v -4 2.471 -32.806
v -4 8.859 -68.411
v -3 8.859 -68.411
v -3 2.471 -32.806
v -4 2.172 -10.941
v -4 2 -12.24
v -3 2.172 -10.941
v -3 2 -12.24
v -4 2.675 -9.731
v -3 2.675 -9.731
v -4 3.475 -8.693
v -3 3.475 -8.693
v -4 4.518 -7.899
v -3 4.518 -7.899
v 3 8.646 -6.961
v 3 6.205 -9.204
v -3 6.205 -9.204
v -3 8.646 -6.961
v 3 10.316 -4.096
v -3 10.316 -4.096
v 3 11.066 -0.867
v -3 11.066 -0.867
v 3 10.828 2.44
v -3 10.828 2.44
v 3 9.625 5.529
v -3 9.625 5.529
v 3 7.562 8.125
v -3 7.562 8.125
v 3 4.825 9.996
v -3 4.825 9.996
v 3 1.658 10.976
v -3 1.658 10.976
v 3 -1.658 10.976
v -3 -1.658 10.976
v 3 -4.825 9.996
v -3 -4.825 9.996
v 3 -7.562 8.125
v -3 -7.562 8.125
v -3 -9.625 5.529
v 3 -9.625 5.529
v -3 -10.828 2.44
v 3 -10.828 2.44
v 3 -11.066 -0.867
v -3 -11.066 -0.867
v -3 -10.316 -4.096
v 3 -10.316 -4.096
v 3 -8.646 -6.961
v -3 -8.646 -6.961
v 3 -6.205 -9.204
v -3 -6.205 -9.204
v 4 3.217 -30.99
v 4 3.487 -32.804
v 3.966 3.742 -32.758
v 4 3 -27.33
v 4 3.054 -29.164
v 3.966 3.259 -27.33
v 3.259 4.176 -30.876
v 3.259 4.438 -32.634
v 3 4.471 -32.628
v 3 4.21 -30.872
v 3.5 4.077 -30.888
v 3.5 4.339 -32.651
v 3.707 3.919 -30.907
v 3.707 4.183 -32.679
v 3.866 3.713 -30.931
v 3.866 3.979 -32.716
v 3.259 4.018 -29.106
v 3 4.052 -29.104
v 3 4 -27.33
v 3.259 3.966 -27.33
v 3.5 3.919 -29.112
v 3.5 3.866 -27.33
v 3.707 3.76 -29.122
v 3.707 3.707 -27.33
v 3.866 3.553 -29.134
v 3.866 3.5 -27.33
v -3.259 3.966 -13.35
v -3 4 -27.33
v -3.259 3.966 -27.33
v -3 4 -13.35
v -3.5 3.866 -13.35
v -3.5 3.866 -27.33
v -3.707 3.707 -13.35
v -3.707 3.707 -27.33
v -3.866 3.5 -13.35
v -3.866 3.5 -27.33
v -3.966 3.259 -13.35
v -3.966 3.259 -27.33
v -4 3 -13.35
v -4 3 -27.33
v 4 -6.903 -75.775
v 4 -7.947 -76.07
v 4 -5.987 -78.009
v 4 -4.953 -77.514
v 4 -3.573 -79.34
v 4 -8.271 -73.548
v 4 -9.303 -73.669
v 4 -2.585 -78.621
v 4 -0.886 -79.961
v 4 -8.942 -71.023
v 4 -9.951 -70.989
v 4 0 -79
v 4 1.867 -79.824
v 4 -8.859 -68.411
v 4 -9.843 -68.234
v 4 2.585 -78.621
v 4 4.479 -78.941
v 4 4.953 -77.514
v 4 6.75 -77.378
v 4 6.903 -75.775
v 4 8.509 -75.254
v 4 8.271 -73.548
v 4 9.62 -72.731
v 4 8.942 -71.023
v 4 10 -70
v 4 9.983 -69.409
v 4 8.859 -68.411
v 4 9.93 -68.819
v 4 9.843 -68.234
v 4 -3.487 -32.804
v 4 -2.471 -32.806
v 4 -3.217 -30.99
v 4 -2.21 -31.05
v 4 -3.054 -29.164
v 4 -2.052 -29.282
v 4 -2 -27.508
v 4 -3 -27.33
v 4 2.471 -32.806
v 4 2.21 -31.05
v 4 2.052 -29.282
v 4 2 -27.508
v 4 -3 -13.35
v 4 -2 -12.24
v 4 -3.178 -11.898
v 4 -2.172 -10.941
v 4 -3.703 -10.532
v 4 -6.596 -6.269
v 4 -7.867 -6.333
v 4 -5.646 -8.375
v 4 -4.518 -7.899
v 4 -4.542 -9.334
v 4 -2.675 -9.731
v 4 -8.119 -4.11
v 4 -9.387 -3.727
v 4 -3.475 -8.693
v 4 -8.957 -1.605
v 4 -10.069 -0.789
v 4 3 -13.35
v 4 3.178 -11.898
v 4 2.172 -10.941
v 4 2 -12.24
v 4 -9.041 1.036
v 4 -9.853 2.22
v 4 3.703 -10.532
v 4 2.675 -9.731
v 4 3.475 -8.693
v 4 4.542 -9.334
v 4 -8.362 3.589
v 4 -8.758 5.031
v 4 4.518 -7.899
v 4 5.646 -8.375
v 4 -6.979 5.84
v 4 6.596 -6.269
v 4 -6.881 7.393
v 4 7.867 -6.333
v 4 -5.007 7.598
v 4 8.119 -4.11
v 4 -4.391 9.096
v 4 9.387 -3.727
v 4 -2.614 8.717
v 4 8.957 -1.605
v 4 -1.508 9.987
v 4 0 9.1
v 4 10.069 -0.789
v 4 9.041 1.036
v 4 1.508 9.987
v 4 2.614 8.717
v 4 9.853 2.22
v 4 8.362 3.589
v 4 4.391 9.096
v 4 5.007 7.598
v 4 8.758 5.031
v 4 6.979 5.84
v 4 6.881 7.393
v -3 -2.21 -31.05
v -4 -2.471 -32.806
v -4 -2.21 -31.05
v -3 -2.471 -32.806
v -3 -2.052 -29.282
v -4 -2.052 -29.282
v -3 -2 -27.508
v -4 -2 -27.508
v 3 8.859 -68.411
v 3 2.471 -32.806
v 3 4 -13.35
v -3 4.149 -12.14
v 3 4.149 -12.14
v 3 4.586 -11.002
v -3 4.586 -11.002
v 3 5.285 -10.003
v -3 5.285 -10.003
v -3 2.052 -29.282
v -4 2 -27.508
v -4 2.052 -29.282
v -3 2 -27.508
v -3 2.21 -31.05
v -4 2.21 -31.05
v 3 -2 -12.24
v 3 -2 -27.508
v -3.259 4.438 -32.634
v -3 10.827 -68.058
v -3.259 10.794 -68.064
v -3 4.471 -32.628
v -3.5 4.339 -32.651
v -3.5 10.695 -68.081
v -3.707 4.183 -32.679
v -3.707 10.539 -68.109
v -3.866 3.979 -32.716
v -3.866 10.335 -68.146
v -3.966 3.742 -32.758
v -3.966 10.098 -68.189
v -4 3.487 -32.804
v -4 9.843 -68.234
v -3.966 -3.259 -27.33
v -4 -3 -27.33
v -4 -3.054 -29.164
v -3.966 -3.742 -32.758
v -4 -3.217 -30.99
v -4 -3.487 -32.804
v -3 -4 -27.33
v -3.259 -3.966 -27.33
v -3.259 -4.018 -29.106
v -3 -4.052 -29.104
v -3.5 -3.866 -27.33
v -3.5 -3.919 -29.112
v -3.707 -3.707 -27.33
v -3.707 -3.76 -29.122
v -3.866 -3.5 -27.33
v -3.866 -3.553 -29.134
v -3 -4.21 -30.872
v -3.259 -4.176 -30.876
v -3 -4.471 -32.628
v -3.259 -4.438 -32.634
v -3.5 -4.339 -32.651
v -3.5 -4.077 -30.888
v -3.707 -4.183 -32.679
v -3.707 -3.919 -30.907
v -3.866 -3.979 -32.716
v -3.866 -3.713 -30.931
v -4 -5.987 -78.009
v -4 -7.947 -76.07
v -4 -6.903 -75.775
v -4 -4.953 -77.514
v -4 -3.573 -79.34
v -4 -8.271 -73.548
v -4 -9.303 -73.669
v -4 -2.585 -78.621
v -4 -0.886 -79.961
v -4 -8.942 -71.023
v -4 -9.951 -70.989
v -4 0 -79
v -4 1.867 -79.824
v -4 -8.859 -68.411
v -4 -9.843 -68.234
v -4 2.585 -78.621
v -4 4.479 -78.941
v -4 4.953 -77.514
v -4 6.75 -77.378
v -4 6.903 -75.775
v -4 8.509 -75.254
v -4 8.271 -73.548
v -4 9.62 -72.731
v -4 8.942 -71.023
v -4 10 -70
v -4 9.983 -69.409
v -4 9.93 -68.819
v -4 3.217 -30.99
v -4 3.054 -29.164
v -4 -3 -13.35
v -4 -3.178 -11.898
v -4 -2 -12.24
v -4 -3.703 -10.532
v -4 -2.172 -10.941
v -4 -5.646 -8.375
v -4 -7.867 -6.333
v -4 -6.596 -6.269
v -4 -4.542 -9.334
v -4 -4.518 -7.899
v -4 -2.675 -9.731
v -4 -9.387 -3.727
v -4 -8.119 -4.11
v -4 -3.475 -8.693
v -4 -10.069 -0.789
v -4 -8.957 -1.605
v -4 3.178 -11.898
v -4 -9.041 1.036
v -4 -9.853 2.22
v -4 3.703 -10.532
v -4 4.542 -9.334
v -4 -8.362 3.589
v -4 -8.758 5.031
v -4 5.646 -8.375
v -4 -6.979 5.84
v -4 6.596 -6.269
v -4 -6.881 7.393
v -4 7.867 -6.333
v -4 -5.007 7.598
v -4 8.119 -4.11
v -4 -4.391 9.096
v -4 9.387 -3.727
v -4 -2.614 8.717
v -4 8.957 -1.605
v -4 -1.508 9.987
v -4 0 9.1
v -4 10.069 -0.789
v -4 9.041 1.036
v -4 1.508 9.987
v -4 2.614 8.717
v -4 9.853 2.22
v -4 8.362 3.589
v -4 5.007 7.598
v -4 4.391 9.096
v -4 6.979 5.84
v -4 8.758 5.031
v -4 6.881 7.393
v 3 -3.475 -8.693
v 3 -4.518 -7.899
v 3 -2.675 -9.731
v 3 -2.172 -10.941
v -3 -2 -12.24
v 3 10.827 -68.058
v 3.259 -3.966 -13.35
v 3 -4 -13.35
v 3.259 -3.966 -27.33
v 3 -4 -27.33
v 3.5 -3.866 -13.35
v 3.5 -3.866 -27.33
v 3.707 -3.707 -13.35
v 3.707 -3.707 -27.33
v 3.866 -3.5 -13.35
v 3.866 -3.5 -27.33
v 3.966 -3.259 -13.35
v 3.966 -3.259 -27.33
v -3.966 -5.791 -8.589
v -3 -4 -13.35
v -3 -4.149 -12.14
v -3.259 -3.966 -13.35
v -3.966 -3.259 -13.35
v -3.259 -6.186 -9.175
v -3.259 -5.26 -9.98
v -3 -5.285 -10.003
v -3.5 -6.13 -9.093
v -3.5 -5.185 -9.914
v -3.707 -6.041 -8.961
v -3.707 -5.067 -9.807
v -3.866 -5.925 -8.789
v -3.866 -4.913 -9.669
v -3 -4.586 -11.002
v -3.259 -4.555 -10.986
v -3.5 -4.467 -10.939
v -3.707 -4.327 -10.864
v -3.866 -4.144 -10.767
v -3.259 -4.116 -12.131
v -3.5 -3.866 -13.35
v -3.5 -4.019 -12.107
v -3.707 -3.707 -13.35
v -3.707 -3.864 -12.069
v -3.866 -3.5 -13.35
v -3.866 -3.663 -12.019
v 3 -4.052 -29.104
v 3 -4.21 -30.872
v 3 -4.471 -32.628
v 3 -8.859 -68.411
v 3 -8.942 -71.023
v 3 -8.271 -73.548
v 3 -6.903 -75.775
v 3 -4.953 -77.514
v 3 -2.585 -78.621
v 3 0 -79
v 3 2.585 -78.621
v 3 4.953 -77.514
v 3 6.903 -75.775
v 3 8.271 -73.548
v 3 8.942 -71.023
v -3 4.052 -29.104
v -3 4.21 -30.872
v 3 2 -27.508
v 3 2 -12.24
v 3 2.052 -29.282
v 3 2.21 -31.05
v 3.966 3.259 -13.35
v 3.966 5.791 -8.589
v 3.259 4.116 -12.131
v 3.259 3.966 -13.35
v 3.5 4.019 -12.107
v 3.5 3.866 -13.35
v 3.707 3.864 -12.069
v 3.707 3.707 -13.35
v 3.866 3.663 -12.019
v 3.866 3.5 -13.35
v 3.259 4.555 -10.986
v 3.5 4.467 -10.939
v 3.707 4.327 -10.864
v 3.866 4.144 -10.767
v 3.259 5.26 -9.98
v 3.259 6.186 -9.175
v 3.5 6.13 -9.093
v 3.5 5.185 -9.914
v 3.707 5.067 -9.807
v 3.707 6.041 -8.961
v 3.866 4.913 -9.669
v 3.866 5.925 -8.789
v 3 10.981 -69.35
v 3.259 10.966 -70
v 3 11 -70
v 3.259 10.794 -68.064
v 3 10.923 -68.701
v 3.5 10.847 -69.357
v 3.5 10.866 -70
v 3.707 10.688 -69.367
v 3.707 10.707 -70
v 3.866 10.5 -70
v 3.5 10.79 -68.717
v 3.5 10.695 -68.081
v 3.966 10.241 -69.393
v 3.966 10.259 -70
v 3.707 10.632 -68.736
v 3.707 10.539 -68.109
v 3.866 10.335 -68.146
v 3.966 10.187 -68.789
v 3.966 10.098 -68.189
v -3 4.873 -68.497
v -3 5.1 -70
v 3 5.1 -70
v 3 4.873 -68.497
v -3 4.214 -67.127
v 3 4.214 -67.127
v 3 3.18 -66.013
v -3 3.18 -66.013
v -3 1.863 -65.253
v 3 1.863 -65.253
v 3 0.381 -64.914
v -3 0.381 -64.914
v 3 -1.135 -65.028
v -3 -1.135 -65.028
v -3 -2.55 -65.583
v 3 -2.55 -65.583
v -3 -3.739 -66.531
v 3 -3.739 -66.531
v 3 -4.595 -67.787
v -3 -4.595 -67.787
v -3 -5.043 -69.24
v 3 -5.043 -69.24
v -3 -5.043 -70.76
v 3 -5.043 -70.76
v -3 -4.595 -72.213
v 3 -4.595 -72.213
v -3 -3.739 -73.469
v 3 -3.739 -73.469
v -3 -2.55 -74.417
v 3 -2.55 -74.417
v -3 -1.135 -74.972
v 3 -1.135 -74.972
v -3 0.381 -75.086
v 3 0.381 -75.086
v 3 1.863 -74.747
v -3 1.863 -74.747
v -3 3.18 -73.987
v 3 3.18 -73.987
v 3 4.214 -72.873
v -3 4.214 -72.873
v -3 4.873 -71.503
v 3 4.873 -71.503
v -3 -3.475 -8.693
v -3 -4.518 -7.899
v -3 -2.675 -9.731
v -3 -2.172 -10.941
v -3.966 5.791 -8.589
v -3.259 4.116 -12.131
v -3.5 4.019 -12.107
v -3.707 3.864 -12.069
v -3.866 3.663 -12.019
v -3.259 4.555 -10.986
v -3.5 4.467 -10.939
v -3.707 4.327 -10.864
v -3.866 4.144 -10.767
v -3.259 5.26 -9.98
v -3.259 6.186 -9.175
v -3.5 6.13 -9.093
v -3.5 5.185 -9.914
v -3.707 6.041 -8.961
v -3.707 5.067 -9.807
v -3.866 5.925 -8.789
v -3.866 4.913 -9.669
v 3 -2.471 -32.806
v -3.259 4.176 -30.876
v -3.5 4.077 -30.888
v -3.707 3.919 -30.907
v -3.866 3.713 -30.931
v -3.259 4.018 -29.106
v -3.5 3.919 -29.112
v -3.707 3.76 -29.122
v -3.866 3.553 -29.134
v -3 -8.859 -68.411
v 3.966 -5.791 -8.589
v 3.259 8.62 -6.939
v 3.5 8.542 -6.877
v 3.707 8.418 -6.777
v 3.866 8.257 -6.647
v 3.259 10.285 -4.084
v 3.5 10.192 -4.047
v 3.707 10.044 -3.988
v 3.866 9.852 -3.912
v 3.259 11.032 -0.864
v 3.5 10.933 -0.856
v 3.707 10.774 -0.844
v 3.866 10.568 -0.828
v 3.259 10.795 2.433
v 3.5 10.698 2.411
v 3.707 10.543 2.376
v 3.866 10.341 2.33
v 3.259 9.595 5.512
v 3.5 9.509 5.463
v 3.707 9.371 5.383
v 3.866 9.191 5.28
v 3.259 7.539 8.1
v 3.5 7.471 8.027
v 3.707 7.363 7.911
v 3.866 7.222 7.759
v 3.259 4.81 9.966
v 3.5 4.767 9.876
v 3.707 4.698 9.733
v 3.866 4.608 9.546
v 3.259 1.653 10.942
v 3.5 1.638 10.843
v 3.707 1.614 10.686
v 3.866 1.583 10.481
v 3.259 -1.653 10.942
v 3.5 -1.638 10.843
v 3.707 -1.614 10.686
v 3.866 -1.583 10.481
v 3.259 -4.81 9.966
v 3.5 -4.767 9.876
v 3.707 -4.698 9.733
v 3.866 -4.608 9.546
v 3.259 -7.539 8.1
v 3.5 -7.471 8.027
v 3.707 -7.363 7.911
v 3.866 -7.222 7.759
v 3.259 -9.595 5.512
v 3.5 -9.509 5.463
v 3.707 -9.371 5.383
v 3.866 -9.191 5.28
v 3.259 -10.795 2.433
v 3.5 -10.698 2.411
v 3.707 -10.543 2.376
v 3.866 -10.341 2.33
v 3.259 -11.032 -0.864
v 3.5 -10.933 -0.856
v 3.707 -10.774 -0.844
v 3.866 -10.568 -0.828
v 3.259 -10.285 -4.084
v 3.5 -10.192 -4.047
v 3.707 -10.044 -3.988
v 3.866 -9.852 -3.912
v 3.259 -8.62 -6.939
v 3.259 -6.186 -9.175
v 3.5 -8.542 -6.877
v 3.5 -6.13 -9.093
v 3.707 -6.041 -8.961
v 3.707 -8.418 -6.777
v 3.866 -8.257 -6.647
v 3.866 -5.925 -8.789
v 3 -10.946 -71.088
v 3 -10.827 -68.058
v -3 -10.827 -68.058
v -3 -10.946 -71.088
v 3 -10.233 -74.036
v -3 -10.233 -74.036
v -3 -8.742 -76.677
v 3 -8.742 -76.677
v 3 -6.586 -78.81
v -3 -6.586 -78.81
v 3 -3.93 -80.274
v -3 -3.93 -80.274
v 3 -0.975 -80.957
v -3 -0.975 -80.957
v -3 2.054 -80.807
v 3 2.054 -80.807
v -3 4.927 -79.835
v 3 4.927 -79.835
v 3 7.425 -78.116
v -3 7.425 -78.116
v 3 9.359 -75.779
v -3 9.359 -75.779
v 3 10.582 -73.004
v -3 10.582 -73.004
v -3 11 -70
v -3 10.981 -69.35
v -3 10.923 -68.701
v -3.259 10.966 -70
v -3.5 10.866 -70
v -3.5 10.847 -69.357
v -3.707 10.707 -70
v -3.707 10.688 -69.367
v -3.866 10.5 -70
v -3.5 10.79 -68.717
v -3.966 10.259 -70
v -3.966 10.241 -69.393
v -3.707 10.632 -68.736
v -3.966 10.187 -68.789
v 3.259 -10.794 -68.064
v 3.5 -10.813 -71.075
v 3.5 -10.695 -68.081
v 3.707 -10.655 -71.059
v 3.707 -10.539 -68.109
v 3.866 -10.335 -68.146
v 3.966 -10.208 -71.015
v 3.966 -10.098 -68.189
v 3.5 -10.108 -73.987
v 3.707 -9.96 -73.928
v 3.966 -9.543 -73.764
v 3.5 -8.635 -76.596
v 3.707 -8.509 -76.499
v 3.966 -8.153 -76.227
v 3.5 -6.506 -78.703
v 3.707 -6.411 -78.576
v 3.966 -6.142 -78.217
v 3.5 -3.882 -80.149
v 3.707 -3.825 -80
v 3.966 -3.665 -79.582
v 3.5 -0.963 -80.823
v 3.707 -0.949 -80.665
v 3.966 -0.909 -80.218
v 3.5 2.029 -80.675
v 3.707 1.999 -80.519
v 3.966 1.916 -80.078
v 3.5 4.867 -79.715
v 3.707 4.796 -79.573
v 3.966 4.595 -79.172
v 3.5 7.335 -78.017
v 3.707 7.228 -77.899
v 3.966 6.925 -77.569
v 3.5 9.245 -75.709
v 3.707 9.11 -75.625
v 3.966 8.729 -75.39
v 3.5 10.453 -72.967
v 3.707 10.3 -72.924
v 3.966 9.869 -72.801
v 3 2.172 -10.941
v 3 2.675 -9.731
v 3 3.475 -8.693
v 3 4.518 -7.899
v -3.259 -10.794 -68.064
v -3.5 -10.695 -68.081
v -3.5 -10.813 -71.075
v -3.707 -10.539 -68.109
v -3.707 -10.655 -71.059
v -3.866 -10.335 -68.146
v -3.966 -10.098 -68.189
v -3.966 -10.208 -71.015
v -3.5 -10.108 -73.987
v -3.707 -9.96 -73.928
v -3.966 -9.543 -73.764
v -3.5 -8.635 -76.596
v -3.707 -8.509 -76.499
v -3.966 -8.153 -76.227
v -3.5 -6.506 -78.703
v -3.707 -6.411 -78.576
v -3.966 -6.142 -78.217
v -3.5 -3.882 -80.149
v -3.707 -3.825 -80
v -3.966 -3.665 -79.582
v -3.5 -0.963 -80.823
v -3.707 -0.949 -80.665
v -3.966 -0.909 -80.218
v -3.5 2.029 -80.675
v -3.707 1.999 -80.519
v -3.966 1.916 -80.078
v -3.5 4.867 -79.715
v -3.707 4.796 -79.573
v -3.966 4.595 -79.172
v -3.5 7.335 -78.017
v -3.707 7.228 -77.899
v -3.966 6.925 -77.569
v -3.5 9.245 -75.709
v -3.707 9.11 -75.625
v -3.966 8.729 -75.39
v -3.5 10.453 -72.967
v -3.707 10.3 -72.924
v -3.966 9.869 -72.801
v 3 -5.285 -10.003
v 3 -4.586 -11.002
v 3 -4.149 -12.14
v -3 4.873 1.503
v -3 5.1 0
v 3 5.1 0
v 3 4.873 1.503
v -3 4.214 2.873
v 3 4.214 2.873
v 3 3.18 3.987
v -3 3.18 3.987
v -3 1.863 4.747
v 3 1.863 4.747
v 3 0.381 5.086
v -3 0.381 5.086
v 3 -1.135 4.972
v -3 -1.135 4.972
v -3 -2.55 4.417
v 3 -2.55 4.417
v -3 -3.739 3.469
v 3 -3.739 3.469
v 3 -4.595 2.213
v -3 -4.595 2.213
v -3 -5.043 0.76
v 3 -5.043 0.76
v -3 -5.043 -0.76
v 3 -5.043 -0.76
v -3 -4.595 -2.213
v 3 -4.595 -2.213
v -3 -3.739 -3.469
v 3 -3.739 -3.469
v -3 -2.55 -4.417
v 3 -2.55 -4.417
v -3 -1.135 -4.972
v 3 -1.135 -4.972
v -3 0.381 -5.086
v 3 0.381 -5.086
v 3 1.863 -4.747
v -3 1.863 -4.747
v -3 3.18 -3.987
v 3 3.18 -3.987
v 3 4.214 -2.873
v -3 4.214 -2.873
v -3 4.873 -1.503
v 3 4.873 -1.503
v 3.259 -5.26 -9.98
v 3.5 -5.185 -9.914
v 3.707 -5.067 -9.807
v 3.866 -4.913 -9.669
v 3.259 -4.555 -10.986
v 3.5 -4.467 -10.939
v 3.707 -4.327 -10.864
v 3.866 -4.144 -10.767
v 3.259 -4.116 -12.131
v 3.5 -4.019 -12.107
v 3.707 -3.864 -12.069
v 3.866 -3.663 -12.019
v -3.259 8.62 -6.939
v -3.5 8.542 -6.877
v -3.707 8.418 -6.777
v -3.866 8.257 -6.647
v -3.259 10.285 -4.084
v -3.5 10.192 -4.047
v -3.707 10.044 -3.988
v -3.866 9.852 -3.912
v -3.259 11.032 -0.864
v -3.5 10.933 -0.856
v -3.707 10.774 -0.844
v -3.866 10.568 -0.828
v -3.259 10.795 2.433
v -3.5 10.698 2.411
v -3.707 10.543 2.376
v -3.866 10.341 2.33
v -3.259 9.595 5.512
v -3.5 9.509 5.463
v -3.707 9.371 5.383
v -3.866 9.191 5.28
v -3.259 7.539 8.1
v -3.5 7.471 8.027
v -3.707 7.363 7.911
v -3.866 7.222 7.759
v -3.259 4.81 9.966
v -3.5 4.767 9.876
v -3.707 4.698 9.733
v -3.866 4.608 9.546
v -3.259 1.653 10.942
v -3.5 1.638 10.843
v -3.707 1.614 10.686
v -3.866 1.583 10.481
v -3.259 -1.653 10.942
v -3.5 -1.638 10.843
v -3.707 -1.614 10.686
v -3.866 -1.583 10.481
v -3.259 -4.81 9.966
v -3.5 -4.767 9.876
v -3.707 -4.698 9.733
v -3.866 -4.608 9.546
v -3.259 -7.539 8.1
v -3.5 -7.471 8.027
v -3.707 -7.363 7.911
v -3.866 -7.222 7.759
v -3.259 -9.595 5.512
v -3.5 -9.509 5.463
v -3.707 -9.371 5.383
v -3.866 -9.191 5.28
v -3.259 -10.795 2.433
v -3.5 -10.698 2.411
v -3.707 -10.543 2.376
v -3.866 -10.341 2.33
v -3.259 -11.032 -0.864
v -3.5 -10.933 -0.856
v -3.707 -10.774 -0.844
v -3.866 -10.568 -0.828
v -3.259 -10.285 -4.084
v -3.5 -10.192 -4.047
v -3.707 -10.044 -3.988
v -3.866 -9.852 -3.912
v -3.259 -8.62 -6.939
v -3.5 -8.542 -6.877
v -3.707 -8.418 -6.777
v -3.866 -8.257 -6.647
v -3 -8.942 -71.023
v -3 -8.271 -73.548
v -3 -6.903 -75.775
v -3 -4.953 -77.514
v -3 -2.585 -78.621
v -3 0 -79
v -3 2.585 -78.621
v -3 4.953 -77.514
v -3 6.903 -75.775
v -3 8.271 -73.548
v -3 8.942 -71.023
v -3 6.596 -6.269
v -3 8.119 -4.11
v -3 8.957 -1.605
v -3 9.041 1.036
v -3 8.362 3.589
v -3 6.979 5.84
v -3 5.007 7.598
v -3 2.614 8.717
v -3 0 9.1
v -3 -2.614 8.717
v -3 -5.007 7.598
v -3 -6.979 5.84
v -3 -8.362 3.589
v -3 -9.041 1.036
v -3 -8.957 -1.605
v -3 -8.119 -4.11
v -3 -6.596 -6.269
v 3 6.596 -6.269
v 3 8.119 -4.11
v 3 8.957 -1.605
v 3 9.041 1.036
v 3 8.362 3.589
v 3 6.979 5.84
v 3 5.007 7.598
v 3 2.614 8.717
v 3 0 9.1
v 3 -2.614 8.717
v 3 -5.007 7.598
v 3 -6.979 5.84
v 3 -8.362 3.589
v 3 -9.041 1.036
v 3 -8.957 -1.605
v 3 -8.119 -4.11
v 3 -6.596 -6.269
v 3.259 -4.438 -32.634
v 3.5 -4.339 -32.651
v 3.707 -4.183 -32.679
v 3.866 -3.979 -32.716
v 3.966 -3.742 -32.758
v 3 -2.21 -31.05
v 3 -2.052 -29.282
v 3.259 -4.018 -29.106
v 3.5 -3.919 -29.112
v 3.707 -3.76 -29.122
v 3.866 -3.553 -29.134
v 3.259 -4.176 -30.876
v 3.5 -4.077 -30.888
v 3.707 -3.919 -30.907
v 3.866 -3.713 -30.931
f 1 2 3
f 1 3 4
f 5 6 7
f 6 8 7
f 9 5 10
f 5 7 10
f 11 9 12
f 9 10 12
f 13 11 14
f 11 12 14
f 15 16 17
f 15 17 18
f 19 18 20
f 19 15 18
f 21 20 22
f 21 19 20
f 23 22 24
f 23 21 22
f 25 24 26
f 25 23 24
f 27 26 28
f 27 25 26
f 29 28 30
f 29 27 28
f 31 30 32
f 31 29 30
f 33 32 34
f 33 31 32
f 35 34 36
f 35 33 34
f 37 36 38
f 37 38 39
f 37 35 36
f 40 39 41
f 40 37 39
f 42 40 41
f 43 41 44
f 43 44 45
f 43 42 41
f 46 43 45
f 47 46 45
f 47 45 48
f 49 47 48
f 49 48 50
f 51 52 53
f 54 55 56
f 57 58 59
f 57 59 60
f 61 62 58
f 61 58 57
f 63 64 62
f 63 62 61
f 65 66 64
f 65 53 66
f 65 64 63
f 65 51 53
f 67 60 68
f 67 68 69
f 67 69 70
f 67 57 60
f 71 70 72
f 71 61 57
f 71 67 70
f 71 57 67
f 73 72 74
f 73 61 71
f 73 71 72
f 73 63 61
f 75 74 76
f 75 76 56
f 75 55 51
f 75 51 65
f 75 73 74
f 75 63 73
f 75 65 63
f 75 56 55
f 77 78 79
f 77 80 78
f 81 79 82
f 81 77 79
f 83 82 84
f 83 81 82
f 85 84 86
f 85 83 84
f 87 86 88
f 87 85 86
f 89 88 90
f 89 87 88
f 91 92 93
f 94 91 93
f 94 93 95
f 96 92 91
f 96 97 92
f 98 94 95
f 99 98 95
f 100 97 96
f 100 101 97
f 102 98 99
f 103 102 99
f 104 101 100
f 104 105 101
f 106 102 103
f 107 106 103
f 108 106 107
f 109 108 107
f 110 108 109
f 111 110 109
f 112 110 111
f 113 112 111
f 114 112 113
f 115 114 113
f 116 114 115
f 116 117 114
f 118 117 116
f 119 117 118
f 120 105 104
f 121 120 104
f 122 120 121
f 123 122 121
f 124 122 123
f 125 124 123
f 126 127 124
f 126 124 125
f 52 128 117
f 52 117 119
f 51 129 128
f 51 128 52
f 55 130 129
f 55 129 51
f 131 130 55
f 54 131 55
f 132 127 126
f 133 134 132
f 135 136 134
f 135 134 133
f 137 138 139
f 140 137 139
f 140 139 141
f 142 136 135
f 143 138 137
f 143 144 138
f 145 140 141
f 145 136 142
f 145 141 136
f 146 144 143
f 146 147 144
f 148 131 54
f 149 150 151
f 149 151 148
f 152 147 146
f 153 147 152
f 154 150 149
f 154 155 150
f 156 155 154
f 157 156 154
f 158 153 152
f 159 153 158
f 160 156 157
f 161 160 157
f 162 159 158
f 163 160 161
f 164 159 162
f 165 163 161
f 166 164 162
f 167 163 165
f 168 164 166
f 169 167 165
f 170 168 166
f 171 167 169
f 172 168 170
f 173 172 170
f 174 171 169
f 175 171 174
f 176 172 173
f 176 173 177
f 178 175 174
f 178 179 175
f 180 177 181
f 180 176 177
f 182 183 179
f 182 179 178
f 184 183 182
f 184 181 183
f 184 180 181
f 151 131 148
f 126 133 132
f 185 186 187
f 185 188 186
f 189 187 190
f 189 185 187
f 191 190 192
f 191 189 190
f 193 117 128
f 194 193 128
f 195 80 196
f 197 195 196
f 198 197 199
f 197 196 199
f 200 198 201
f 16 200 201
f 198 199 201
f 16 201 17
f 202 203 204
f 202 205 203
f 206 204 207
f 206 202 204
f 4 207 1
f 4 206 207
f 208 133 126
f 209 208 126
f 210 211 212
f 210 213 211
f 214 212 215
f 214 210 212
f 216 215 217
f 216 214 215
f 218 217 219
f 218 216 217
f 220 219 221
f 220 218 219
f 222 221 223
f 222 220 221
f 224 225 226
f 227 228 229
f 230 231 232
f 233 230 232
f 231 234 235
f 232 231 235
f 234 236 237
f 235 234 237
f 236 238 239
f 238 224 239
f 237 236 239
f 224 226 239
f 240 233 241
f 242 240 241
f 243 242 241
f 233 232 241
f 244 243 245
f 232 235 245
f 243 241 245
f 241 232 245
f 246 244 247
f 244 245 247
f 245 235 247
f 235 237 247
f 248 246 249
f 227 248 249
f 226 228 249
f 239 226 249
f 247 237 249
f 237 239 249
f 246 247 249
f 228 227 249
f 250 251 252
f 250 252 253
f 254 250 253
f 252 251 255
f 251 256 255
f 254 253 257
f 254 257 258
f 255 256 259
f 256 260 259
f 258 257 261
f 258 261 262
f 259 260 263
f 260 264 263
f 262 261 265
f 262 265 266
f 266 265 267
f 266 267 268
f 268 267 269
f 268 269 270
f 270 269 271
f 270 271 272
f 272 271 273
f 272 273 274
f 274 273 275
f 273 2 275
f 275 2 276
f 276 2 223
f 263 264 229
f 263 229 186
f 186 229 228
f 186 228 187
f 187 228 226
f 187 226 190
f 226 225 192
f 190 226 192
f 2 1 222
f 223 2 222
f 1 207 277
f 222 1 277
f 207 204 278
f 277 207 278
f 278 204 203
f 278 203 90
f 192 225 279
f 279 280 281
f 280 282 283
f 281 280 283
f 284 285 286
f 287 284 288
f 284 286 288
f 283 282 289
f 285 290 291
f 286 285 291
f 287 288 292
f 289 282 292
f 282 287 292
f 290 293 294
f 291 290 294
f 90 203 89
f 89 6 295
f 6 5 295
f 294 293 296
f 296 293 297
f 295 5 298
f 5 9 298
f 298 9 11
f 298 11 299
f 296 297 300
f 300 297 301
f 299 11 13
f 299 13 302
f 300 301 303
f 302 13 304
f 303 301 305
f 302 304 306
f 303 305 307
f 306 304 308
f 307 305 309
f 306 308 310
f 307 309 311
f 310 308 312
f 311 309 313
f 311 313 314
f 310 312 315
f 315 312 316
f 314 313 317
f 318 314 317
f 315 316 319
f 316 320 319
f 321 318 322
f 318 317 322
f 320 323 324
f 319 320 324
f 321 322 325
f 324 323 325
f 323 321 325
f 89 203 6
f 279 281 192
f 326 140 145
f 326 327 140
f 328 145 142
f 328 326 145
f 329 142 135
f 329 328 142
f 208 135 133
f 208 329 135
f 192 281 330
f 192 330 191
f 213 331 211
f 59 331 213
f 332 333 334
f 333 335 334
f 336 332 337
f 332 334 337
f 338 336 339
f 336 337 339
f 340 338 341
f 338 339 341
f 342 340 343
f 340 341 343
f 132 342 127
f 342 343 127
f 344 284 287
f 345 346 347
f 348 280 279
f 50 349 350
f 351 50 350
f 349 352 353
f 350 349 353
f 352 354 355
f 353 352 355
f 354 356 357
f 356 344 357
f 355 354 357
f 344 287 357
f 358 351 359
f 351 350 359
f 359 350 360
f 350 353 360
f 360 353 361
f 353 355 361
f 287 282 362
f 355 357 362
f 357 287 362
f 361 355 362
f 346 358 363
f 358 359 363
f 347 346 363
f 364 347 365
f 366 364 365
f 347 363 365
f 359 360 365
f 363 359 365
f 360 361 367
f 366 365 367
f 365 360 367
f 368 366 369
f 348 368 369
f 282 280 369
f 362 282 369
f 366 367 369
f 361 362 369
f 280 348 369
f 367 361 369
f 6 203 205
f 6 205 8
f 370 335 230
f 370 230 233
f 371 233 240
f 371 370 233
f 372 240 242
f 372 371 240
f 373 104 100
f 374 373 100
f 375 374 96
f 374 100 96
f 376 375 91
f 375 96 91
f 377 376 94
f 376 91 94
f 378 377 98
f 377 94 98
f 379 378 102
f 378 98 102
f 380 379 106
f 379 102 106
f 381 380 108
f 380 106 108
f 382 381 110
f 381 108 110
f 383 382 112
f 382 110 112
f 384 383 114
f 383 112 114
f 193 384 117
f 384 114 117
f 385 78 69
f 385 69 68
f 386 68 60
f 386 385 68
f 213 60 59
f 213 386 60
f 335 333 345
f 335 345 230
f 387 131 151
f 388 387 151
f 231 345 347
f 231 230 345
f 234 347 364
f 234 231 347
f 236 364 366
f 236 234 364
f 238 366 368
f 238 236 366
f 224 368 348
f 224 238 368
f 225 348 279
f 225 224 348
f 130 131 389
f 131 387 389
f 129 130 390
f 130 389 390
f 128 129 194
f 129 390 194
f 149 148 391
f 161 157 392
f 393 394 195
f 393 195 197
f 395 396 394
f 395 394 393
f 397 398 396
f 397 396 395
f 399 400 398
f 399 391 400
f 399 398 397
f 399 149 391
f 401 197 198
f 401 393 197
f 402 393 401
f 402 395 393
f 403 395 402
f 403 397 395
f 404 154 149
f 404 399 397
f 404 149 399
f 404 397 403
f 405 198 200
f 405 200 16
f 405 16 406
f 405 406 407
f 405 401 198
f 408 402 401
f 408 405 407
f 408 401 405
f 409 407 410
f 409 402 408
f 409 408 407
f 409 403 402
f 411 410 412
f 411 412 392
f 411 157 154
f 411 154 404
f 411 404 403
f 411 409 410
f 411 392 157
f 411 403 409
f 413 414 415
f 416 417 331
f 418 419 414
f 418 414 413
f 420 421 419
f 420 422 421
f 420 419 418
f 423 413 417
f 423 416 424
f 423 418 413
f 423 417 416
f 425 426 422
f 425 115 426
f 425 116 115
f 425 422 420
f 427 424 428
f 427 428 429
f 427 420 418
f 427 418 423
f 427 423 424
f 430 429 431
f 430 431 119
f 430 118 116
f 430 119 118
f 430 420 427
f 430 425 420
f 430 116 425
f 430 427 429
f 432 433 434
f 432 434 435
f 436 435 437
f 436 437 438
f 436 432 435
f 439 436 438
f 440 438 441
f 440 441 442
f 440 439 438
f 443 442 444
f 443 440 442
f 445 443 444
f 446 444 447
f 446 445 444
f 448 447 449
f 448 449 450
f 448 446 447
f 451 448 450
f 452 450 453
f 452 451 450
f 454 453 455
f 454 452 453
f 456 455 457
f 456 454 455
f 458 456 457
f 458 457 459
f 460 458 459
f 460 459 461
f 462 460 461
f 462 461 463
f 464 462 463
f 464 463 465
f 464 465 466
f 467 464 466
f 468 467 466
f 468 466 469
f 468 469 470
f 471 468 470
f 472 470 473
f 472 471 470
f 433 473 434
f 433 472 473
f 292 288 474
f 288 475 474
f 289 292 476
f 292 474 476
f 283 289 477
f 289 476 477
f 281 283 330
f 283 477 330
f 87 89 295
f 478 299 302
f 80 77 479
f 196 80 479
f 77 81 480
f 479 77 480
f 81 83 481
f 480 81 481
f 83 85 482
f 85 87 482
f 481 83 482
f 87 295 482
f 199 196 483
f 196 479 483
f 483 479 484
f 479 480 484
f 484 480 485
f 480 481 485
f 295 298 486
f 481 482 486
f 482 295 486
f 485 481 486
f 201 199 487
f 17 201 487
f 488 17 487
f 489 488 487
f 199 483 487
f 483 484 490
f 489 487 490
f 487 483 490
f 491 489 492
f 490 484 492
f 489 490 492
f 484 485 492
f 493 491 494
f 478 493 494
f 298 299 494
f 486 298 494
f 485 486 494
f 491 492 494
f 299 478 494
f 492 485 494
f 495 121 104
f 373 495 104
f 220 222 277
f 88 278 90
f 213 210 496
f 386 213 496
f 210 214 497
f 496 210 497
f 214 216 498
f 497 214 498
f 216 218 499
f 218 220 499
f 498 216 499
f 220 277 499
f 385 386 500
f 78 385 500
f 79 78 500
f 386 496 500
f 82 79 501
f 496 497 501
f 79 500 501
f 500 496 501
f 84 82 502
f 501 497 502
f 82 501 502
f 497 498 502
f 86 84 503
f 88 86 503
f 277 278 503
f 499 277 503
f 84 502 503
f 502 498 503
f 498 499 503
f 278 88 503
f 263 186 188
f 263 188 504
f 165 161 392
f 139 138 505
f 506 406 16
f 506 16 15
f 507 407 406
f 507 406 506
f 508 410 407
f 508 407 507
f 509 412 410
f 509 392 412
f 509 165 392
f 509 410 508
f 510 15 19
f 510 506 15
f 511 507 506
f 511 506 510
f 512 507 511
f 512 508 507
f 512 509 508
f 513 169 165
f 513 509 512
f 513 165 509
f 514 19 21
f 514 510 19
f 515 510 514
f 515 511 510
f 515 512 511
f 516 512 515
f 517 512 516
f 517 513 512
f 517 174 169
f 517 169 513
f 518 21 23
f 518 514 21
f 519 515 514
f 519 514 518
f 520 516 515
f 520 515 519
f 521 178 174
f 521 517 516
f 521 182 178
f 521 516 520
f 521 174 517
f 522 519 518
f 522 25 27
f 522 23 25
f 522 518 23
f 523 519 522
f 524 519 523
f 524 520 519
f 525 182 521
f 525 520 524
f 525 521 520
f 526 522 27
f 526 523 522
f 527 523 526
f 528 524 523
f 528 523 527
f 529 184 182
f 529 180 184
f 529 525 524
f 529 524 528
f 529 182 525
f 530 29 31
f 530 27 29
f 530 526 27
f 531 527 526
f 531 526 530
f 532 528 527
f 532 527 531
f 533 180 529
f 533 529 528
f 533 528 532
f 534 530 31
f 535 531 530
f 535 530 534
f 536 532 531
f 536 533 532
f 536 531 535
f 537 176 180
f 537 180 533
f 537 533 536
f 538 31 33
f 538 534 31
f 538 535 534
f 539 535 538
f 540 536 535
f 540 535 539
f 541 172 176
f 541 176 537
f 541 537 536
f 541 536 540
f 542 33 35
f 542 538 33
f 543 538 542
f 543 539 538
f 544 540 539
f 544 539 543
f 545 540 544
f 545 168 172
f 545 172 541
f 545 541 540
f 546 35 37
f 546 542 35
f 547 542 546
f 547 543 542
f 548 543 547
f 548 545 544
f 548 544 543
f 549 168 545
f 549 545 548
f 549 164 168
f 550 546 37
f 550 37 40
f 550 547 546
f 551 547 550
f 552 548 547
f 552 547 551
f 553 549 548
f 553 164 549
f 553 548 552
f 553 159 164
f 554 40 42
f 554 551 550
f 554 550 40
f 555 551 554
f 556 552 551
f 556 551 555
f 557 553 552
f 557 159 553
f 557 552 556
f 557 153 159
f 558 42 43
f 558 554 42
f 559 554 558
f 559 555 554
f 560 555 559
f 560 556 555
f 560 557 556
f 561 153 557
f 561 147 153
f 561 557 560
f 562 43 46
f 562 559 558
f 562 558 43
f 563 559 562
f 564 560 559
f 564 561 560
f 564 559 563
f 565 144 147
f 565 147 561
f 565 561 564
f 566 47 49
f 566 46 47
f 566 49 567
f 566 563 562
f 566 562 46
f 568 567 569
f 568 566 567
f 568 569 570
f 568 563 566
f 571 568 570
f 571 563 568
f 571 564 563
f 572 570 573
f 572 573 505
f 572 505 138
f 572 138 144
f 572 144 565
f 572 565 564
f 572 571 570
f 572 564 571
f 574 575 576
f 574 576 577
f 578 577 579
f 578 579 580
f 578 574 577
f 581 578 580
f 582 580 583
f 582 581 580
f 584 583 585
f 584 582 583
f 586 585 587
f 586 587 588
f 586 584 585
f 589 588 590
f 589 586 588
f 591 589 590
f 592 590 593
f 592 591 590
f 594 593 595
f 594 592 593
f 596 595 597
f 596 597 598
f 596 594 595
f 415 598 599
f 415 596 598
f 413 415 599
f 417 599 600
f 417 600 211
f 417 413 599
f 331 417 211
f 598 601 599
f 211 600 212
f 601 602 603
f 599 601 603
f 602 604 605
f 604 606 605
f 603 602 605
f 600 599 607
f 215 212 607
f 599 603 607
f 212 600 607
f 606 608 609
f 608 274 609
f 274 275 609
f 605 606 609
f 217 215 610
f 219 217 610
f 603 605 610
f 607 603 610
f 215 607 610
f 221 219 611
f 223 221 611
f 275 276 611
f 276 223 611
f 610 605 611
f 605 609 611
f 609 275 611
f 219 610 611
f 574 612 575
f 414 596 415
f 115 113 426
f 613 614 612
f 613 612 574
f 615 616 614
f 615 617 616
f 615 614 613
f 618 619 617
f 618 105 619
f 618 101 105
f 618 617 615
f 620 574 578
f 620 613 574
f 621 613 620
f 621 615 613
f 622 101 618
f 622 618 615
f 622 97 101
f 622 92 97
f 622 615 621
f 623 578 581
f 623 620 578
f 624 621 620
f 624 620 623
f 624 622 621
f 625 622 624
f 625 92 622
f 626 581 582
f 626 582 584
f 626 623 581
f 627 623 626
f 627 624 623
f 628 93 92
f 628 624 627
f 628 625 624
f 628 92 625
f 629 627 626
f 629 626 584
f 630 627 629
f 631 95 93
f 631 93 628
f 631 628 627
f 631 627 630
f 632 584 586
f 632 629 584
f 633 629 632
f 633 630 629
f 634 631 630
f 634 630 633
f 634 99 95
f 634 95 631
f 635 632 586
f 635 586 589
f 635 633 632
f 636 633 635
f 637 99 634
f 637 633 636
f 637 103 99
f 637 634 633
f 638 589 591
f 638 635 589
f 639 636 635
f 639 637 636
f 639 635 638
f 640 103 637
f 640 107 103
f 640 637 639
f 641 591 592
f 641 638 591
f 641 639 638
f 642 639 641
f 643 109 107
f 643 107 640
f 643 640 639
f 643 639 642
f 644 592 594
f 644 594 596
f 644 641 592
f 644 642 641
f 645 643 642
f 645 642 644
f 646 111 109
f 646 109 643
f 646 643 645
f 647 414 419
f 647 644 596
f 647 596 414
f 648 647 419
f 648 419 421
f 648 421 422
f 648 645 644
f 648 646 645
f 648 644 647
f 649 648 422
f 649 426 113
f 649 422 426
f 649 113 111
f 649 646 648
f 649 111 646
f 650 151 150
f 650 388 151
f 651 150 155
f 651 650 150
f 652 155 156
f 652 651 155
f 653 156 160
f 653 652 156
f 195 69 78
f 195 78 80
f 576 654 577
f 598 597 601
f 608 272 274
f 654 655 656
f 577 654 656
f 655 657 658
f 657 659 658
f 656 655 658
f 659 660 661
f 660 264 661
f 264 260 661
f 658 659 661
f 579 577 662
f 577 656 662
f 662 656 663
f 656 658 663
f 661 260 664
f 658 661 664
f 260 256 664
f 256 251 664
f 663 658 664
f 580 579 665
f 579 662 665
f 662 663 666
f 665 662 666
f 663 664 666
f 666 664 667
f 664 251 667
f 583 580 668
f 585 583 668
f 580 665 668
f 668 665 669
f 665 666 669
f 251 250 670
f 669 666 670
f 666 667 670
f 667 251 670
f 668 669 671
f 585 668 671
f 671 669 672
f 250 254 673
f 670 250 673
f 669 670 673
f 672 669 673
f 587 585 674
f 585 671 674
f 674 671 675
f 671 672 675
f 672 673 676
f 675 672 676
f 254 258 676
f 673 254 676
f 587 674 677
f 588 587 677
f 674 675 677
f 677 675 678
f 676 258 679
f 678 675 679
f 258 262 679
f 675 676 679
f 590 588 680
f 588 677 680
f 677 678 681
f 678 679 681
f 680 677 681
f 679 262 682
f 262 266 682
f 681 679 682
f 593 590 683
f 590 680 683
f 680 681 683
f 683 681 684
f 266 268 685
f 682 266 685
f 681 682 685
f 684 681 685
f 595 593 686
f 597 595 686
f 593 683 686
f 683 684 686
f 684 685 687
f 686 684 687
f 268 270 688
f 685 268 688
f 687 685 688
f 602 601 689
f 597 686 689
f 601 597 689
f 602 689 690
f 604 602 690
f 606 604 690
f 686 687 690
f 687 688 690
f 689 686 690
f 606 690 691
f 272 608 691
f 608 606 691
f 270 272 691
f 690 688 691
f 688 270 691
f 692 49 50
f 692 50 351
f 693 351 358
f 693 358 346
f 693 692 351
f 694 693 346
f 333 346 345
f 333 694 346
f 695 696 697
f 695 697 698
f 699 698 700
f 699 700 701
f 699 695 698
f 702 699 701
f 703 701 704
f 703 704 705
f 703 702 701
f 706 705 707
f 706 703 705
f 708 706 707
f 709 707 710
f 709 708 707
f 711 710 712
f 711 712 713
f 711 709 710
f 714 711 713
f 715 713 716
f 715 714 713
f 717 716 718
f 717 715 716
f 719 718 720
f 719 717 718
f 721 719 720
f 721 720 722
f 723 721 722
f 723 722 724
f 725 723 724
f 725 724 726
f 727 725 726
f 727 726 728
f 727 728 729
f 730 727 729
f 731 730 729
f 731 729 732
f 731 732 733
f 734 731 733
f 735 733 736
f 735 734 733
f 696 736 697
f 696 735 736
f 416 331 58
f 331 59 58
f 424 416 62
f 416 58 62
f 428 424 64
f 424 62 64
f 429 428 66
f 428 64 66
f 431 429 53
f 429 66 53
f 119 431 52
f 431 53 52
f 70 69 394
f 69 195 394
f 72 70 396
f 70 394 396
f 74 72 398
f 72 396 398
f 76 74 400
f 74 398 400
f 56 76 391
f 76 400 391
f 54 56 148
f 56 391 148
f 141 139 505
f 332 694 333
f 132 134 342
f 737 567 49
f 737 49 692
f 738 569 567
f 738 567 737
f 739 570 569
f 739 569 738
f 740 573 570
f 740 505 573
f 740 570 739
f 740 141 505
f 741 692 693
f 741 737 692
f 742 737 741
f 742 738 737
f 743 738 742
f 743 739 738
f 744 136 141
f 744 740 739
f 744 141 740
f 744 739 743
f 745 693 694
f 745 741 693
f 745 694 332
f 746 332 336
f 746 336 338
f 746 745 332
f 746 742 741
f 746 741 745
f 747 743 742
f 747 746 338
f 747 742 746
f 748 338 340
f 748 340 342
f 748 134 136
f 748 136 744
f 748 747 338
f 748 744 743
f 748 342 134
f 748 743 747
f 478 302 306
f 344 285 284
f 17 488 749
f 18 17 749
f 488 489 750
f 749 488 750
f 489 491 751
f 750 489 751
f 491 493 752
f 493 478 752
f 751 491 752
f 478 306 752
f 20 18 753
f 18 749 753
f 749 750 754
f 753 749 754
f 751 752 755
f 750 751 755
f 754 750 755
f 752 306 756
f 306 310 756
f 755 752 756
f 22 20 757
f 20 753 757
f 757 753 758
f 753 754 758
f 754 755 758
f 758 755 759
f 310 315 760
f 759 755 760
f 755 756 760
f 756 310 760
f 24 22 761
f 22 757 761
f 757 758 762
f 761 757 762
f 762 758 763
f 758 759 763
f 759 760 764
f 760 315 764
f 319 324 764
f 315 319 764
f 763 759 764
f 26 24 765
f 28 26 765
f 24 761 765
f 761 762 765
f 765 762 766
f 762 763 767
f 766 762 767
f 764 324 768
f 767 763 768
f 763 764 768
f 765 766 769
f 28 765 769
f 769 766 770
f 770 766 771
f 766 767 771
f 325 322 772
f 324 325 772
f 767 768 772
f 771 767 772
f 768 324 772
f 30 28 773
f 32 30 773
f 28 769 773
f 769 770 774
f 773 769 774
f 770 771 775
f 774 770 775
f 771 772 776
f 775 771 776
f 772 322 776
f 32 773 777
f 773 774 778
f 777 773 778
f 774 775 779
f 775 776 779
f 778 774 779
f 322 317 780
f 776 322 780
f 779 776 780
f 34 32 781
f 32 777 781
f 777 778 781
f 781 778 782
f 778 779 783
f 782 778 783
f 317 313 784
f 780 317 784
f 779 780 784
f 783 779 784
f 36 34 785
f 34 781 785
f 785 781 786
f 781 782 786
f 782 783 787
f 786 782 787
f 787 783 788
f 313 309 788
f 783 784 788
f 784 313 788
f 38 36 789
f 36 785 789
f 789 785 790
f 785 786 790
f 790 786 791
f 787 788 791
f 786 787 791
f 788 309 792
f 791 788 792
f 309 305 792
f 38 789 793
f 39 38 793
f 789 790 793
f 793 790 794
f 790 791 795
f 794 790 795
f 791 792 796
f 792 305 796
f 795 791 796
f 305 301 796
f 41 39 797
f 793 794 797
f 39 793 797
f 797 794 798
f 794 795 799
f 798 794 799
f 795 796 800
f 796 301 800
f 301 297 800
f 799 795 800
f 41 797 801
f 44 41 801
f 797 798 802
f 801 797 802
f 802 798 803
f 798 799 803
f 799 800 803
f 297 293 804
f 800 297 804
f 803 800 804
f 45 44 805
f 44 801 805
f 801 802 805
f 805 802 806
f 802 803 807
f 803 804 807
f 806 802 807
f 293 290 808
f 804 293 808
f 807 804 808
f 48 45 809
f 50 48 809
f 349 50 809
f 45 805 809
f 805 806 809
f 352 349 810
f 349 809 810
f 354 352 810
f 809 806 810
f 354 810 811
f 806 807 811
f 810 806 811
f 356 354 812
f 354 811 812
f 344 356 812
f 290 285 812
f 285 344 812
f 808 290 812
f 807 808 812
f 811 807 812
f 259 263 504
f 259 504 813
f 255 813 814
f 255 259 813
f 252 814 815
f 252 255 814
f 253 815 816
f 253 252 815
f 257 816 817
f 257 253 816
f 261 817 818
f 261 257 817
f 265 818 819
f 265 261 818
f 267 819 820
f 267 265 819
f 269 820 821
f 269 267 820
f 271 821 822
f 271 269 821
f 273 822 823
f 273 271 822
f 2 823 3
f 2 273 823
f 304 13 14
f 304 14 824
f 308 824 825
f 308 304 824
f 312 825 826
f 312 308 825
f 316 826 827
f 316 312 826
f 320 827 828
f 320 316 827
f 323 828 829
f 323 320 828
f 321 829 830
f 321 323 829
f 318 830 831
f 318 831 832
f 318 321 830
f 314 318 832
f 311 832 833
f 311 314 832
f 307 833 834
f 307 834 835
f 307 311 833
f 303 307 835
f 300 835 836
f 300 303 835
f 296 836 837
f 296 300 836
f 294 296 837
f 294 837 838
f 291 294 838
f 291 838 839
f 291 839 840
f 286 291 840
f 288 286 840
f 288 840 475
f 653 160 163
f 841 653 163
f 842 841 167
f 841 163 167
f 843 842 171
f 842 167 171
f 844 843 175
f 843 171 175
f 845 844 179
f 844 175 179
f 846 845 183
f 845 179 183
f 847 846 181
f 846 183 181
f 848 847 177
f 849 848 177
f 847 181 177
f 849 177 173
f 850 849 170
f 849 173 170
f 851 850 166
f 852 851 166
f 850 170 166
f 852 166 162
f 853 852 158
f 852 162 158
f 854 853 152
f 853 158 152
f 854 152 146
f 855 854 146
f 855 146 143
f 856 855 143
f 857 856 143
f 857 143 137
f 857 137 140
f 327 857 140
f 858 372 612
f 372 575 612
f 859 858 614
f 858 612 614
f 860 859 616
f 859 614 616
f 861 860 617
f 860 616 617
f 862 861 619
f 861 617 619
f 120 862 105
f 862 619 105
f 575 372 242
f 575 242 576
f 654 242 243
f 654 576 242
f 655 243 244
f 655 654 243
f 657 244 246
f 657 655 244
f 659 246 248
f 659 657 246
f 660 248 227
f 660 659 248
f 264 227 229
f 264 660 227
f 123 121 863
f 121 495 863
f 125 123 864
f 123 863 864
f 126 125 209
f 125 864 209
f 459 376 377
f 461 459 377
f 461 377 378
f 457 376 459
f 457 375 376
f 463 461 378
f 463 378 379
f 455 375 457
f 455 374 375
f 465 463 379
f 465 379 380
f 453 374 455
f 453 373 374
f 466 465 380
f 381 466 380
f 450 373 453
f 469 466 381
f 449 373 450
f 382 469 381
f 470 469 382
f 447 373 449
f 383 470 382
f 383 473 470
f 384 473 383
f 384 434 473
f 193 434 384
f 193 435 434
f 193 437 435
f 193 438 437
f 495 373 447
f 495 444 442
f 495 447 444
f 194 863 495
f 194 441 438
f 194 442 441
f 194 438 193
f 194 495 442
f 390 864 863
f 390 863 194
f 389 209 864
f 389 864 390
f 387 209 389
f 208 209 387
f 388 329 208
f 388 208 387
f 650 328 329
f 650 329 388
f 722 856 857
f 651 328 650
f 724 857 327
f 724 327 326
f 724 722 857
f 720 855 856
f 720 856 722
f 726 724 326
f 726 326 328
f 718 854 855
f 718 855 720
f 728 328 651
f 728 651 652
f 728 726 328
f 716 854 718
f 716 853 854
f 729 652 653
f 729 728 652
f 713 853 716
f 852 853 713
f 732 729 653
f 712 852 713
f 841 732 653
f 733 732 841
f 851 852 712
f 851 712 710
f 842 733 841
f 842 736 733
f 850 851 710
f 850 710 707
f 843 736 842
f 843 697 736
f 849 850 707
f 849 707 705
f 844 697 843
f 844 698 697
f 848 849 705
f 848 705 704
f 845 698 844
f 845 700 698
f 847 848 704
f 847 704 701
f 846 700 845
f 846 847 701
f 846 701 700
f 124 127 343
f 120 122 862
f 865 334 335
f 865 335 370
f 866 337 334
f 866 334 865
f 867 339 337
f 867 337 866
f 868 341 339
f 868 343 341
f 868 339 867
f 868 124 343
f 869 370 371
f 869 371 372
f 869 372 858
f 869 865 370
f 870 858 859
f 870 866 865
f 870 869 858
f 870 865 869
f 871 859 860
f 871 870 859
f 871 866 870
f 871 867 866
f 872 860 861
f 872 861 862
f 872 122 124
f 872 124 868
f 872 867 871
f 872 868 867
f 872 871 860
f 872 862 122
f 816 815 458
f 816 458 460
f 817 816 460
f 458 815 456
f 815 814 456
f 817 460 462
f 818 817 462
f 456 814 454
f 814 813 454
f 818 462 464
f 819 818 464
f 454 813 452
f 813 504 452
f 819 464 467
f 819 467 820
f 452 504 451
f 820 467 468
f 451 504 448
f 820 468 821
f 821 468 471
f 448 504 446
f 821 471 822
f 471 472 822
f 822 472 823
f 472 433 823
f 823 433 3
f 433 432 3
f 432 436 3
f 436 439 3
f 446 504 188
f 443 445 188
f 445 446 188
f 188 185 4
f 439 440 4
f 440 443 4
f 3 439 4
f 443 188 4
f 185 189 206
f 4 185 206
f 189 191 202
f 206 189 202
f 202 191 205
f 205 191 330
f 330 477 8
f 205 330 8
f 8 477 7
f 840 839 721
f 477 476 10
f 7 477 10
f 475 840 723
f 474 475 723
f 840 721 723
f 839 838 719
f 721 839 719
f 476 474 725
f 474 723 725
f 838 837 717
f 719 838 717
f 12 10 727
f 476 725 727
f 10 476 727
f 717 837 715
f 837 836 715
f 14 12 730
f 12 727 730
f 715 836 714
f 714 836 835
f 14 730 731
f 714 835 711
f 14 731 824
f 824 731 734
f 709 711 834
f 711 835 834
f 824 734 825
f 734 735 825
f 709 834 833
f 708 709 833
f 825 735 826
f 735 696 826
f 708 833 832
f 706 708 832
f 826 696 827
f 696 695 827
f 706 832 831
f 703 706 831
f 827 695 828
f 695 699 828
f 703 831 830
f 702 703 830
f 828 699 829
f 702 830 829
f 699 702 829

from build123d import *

# Parameters (mm, degrees)
F0_R     = 5.1
F1_DEPTH = 4
F2_R     = 5.1
F3_DEPTH = 1
F4_R     = 30
F5_R     = 5
F6_R     = 5
F7_R     = 30
F8_R     = 1
F9_R     = 1


# Not quite as in the source:
# - a pattern or mirror of a feature is missing from the dataset's text; its kind, count and spacing are read off the source's solid


with BuildPart() as f1:
    # F0 (on Right) → F1 (new body, symmetric)
    with BuildSketch(Plane.YZ):
        with BuildLine():
            ThreePointArc((4, -10.3542261903), (9.1545070867, -6.2773402011), (11.1, 0))
            ThreePointArc((11.1, 0), (-6.2773402011, 9.1545070867), (-4, -10.3542261903))
            ThreePointArc((-4, -10.3542261903), (0, -11.1), (4, -10.3542261903))
        make_face()
        Circle(F0_R, mode=Mode.SUBTRACT)
        with BuildLine():
            ThreePointArc((4, -10.3542261903), (0, -11.1), (-4, -10.3542261903))
            Line((-4, -10.3542261903), (-4, -30))
            Line((-4, -30), (-10.8271665456, -68.0577166546))
            ThreePointArc((-10.8271665456, -68.0577166546), (0, -59), (10.8271665456, -68.0577166546))
            Line((10.8271665456, -68.0577166546), (4, -30))
            Line((4, -30), (4, -10.3542261903))
        make_face()
        with BuildLine():
            ThreePointArc((10.8271665456, -68.0577166546), (0, -59), (-10.8271665456, -68.0577166546))
            ThreePointArc((-10.8271665456, -68.0577166546), (-0.9749789737, -80.9567064395), (11, -70))
            ThreePointArc((11, -70), (10.9567064395, -69.0250210263), (10.8271665456, -68.0577166546))
        make_face()
        with Locations((0, -70)):
            Circle(F0_R, mode=Mode.SUBTRACT)
    extrude(amount=F1_DEPTH, both=True)

    # F2 (on face) → F3 (cut)
    with BuildSketch(Plane.YZ.offset(4)):
        with BuildLine():
            Line((2, -30.1779693522), (2, -8.877499648))
            ThreePointArc((2, -8.877499648), (0, 9.1), (-2, -8.877499648))
            Line((-2, -8.877499648), (-2, -30.1779693522))
            Line((-2, -30.1779693522), (-8.85859081, -68.410859081))
            ThreePointArc((-8.85859081, -68.410859081), (0, -79), (8.85859081, -68.410859081))
            Line((8.85859081, -68.410859081), (2, -30.1779693522))
        make_face()
        with Locations((0, -70)):
            Circle(F2_R, mode=Mode.SUBTRACT)
        Circle(F2_R, mode=Mode.SUBTRACT)
    f3 = extrude(amount=-F3_DEPTH, mode=Mode.SUBTRACT)

    # F3_copies: F3 across plane
    add(f3.mirror(Plane(origin=(0, 0, 0), x_dir=(0, 0, -1), z_dir=(-1, 0, 0))), mode=Mode.SUBTRACT)

    # F4
    f4_edges = [f1.edges().sort_by_distance(p)[0] for p in [
        (0, -4, -30),
        (0, 4, -30),
    ]]
    fillet(f4_edges, radius=F4_R)

    # F5
    f5_edges = [f1.edges().sort_by_distance(p)[0] for p in [
        (0, -4, -10.354226),
        (0, 4, -10.354226),
    ]]
    fillet(f5_edges, radius=F5_R)

    # F6
    f6_edges = [f1.edges().sort_by_distance(p)[0] for p in [
        (3.5, -2, -8.8775),
        (3.5, 2, -8.8775),
        (-3.5, 2, -8.8775),
        (-3.5, -2, -8.8775),
    ]]
    fillet(f6_edges, radius=F6_R)

    # F7
    f7_edges = [f1.edges().sort_by_distance(p)[0] for p in [
        (-3.5, 2, -30.177969),
        (-3.5, -2, -30.177969),
        (3.5, 2, -30.177969),
        (3.5, -2, -30.177969),
    ]]
    fillet(f7_edges, radius=F7_R)

    # F8
    f8_edges = [f1.edges().sort_by_distance(p)[0] for p in [
        (4, 0, 11.1),
        (4, -4.585526, -11.001677),
        (4, -4, -20.339996),
        (4, -4.118073, -29.989493),
        (4, -7.649265, -50.342656),
        (4, 0, -81),
        (4, 7.649265, -50.342656),
        (4, 4.118073, -29.989493),
        (4, 4, -20.339996),
        (4, 4.585526, -11.001677),
    ]]
    fillet(f8_edges, radius=F8_R)

    # F9
    f9_edges = [f1.edges().sort_by_distance(p)[0] for p in [
        (-4, 0, 11.1),
        (-4, -4.585526, -11.001677),
        (-4, 4.585526, -11.001677),
        (-4, 4, -20.339996),
        (-4, -4, -20.339996),
        (-4, -4.118073, -29.989493),
        (-4, -7.649265, -50.342656),
        (-4, 0, -81),
        (-4, 7.649265, -50.342656),
        (-4, 4.118073, -29.989493),
    ]]
    fillet(f9_edges, radius=F9_R)


solid = f1.part
